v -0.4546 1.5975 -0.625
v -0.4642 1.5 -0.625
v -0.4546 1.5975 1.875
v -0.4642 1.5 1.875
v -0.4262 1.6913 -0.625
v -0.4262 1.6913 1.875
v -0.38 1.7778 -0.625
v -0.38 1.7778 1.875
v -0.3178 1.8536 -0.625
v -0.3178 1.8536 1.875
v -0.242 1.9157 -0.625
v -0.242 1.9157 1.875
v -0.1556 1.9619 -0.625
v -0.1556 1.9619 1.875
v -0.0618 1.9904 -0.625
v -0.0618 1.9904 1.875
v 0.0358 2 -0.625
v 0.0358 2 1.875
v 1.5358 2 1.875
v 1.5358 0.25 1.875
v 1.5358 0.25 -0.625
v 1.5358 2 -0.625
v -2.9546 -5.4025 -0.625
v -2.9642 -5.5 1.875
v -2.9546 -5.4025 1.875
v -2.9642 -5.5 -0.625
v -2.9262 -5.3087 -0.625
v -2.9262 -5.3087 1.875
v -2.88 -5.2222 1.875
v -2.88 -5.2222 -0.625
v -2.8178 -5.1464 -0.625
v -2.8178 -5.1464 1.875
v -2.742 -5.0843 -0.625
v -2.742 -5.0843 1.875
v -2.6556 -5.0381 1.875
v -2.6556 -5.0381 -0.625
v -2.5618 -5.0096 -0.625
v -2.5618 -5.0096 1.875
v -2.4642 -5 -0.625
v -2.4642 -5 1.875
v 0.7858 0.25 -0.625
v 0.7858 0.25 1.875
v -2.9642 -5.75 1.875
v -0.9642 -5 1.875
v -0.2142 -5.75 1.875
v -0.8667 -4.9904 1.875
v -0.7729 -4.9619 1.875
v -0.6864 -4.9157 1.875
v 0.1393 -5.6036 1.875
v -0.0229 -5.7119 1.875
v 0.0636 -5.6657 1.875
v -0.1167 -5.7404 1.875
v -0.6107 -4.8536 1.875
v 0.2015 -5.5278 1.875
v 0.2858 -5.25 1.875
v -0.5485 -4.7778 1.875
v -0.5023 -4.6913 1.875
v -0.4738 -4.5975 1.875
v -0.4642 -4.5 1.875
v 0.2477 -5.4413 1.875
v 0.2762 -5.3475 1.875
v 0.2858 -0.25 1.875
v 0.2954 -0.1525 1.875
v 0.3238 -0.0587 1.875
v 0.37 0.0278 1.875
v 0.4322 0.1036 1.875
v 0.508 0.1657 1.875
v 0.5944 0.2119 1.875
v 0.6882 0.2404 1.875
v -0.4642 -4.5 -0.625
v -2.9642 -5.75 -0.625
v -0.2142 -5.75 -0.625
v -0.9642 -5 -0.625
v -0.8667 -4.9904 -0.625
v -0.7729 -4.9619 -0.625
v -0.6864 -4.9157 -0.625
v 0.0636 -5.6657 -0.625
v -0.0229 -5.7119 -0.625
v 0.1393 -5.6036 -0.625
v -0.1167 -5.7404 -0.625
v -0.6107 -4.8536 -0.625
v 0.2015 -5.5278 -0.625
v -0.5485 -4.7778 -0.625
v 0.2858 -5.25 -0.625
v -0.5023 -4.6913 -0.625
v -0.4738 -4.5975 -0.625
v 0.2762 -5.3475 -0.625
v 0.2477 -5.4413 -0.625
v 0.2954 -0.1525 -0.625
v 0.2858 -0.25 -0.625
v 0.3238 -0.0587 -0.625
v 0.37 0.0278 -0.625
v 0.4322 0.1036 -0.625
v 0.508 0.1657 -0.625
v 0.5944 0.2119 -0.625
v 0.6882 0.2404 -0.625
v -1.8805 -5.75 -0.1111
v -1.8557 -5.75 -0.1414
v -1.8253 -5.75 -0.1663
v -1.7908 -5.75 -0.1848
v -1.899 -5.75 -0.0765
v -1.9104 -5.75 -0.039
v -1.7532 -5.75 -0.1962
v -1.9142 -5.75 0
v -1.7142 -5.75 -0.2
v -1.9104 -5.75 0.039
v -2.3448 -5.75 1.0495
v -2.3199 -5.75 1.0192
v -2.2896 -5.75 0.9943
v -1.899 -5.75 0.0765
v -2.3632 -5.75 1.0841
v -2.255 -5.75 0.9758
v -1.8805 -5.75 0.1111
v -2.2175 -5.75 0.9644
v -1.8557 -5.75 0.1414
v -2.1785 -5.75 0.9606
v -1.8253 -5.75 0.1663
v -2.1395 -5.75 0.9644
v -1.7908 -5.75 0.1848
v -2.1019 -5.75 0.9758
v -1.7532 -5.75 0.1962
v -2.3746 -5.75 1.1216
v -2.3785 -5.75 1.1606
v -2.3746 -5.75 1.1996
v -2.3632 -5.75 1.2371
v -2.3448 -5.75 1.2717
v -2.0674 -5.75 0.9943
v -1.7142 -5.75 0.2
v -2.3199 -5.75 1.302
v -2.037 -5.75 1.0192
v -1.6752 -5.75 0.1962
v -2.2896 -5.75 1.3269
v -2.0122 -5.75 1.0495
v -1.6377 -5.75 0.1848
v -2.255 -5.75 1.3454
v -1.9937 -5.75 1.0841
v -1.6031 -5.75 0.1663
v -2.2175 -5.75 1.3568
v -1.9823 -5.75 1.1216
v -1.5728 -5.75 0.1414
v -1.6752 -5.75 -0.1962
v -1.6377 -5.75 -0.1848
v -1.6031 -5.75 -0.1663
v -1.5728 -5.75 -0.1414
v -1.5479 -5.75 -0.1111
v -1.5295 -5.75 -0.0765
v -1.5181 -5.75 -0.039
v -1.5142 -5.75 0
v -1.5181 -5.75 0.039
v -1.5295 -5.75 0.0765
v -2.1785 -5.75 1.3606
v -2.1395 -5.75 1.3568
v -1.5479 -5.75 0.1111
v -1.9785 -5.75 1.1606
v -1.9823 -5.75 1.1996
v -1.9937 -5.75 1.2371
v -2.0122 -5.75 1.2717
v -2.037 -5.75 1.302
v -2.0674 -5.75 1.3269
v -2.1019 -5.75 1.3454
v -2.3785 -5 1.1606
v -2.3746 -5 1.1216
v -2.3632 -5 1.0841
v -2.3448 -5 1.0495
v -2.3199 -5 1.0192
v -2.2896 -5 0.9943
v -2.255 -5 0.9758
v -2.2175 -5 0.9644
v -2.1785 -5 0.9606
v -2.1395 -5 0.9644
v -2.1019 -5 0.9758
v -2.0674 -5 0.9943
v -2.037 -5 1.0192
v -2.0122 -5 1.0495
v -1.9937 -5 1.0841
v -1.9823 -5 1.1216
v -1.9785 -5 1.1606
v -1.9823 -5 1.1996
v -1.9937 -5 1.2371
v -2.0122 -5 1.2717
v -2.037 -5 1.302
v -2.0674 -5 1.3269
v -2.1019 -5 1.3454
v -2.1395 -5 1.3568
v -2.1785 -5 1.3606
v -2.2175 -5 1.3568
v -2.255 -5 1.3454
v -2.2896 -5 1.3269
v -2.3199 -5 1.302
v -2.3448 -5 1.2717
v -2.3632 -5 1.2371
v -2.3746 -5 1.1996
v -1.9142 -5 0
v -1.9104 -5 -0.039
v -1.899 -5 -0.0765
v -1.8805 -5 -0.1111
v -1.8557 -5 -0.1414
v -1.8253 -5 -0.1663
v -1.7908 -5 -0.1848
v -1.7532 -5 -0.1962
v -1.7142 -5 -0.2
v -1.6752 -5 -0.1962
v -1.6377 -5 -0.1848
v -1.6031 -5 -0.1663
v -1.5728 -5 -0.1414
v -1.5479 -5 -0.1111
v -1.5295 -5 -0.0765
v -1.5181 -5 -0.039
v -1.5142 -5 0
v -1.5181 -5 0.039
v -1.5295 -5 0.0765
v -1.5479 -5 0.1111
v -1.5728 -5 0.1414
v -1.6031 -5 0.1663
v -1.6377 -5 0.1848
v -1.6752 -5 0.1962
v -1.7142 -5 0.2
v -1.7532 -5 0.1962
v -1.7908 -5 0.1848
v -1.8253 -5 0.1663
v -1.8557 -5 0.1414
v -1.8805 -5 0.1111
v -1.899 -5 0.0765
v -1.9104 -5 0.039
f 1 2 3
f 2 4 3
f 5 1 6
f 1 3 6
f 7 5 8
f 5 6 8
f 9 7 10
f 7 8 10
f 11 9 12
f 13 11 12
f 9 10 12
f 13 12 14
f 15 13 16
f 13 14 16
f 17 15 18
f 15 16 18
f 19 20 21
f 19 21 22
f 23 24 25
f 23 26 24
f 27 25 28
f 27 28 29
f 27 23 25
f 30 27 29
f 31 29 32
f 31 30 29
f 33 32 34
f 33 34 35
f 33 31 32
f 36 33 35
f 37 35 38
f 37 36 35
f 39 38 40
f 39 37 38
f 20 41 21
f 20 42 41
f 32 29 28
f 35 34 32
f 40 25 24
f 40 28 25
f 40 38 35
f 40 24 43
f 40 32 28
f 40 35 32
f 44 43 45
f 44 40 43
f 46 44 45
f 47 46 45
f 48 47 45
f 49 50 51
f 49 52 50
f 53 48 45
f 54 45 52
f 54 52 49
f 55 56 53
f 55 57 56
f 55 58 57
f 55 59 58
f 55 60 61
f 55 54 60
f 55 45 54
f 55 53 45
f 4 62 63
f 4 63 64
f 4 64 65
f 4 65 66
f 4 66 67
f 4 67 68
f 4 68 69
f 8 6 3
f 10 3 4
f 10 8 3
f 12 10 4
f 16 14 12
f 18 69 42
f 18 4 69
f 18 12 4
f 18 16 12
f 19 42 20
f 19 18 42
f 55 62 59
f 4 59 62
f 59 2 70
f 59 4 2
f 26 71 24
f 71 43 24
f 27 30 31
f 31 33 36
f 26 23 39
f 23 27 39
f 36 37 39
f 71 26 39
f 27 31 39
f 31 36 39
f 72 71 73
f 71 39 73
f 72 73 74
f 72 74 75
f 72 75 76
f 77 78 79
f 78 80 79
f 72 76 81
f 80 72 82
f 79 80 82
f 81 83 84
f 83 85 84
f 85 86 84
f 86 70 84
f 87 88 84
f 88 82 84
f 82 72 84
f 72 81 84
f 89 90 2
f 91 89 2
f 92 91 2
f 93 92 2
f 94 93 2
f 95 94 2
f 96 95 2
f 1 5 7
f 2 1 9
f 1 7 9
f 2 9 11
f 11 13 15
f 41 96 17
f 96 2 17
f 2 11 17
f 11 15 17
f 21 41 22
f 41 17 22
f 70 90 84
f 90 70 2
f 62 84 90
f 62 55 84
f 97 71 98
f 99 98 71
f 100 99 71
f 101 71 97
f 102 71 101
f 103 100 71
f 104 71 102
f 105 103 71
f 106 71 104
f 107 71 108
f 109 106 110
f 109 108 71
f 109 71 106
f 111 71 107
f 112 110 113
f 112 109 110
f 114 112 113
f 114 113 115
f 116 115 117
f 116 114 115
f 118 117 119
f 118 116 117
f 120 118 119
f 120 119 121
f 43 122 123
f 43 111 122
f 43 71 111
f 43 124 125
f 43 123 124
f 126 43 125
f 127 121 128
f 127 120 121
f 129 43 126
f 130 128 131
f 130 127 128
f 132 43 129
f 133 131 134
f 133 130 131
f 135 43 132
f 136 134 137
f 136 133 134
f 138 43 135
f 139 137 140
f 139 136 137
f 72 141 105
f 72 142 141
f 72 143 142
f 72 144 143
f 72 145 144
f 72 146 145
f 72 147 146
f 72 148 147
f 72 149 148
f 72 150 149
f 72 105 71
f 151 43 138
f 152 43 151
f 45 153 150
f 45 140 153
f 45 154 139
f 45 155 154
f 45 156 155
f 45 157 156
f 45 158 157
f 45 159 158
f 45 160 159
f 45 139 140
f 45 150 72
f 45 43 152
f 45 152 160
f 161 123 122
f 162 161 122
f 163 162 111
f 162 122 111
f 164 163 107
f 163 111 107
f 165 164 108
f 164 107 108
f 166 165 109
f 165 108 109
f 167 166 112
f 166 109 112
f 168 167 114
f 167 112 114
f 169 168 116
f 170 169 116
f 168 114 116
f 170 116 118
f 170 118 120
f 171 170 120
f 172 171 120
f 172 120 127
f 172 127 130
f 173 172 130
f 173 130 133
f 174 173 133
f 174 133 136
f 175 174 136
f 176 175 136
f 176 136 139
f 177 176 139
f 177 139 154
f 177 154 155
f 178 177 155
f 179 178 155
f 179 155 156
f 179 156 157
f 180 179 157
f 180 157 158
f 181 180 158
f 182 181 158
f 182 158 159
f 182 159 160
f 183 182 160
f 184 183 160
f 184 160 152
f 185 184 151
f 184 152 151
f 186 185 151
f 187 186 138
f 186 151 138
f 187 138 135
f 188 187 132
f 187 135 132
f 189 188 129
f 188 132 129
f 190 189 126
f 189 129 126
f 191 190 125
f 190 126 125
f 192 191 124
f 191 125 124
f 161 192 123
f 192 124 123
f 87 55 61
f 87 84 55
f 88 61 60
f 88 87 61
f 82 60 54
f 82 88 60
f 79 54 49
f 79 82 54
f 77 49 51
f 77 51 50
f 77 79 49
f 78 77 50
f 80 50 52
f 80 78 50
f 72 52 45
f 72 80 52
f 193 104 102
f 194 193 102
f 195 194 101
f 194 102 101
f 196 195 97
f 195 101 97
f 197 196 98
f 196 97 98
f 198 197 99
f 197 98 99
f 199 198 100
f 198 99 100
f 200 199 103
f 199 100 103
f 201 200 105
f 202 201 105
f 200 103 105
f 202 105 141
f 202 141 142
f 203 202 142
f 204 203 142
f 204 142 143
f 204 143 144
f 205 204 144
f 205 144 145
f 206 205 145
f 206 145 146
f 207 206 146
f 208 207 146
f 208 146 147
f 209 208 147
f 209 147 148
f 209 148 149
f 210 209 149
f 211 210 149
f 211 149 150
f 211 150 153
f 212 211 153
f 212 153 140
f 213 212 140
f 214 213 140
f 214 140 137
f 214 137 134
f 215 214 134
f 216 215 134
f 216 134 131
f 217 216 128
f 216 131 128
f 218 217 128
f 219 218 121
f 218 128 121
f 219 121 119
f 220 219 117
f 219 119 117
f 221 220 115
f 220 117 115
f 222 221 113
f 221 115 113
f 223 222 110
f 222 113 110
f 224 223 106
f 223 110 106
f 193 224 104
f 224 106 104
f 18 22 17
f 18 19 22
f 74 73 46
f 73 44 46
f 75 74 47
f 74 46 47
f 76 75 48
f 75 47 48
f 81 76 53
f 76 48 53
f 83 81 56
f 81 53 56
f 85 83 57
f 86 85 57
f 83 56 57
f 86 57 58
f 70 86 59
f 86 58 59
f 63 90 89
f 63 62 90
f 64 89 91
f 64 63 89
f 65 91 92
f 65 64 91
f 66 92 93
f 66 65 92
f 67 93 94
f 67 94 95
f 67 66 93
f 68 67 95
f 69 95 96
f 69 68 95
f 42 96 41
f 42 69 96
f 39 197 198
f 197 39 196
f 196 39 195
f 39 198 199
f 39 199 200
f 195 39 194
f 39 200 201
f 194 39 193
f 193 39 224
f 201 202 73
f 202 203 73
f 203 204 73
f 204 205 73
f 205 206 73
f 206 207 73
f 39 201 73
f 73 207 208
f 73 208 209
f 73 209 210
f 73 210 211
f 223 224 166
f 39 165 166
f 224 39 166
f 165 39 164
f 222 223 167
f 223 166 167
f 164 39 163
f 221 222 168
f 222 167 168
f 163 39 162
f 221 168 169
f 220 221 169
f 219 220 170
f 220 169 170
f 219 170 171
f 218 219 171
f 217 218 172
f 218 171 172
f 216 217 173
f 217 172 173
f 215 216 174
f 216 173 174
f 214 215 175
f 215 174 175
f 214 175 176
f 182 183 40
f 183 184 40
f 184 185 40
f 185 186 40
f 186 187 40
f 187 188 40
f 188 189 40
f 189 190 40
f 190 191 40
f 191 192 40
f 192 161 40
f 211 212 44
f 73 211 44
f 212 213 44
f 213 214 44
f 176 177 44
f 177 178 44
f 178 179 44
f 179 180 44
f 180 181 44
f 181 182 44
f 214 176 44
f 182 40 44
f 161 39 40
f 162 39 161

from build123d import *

# Parameters (mm, degrees)
SKETCH1_W                  = 2.5
SKETCH1_H                  = 0.75
BOSS_EXTRUDE1_DEPTH        = 1.875
BOSS_EXTRUDE1_DEPTH_BACK   = 0.625
FILLET1_R                  = 0.5
F_0_4_0_4_DIAMETER_HOLE1_D = 0.4


with BuildPart() as part:
    # Sketch1 → Boss-Extrude1 (new body, two sides)
    with BuildSketch(Plane.XY) as boss_extrude1_sk:
        Polygon((0.285769435, 0.25), (-0.464230565, 0.25), (-0.464230565, -5), (-0.464230565, -5.75), (0.285769435, -5.75), align=None)
        Polygon((-0.464230565, 2), (-0.464230565, 0.25), (0.285769435, 0.25), (1.535769435, 0.25), (1.535769435, 2), align=None)
        with Locations((-1.714230565, -5.375)):
            Rectangle(SKETCH1_W, SKETCH1_H)
    extrude(amount=BOSS_EXTRUDE1_DEPTH)
    extrude(boss_extrude1_sk.sketch, amount=-BOSS_EXTRUDE1_DEPTH_BACK)

    # Fillet1
    fillet1_edges = [part.edges().sort_by_distance(p)[0] for p in [
        (0.285769435, 0.25, 0.625),
        (-2.964230565, -5, 0.625),
        (-0.464230565, -5, 0.625),
        (0.285769435, -5.75, 0.625),
        (-0.464230565, 2, 0.625),
    ]]
    fillet(fillet1_edges, radius=FILLET1_R)

    # Ø0.4 (0.4) Diameter Hole1 (through all)
    with Locations(Plane(origin=(0, -5, 0), x_dir=(1, 0, 0), z_dir=(0, 1, 0))):
        with Locations((-1.714230565, 0), (-2.17846891, -1.160595864)):
            Hole(F_0_4_0_4_DIAMETER_HOLE1_D / 2)


solid = part.part
